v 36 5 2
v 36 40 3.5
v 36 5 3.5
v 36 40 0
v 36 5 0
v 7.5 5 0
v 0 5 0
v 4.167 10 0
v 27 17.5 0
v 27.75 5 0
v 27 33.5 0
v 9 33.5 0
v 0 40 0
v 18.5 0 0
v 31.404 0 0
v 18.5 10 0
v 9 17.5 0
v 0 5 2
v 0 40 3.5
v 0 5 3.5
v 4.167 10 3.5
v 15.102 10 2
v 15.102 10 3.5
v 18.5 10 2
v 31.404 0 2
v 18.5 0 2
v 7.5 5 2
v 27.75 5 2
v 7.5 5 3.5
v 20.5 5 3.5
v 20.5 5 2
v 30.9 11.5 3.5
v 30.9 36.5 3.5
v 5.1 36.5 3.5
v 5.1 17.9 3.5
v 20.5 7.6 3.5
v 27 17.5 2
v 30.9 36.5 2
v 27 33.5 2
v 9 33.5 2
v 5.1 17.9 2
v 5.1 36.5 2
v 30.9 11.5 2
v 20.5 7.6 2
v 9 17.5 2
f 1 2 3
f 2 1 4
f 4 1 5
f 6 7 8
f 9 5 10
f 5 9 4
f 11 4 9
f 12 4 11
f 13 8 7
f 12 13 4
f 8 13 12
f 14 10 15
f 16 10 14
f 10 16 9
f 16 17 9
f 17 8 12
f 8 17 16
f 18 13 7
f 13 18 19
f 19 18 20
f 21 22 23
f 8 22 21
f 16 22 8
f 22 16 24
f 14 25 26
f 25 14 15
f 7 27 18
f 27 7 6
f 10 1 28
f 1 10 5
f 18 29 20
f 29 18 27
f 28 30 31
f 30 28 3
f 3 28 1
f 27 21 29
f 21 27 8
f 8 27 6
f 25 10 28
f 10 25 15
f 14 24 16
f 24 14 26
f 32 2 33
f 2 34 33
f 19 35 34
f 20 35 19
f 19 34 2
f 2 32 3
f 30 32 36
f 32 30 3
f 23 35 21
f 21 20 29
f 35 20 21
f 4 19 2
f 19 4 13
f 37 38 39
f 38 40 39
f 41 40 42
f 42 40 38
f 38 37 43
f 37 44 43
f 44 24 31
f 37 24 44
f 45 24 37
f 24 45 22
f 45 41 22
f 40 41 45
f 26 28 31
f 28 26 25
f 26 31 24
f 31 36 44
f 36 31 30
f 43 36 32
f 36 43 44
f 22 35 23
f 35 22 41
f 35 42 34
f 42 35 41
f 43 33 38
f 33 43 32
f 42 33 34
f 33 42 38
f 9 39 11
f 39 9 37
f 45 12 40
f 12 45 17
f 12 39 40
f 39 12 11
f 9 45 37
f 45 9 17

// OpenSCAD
piece_width = 36;
piece_depth = 40;
thickness_full = 3.5;
thickness_thin = 2;
cutout1_depth = 13.5;
cutout1_width = 13.5;
htriml_depth = 5;
htrimr_depth = 5;
htrimc_depth = 10;
htrim2_width = 5;
cutout_mid_x = 18;
cutout_mid_y = 16;
port_piece_depth = 29.5;

tolerance = 0.25;

difference(){
	main_piece();
	translate([(piece_width-25.8)/2,port_piece_depth+7,thickness_thin]) 
			port_piece(12,25.8,25,port_piece_depth,18.6);

	//middle cutout
	translate([(piece_width-cutout_mid_x)/2,cutout1_depth+4,-1]) 
			cube([cutout_mid_x,cutout_mid_y,thickness_full+2]);

	//temp
	//translate([0,14,-1]) cube([piece_width,50,6]);
}

module port_piece(x1,x2,y1,y2,y3){
	linear_extrude(height=(thickness_full-thickness_thin+1))
		translate([x2,0,0]) rotate([0,0,180]) 
		polygon([ [0,0], [0,y1], [x1,y2], [x2,y3], [x2,0] ], [ [0,1,2,3,4] ]);
}


module main_piece() {
difference(){
	cube([piece_width,piece_depth,thickness_full]);
	
	cutout();

	//trim thickness
	translate([0,0,thickness_thin]) 
			cube([piece_width/2+1,htriml_depth,thickness_full]);
	translate([piece_width/2,0,thickness_thin]) 
			cube([piece_width/2+1,htrimr_depth,thickness_full]);
	translate([(piece_width-htrim2_width)/2,0,thickness_thin]) 
			cube([htrim2_width,htrimc_depth,thickness_full]);
}
}

module cutout(){
topline = 0.25;
difference(){
cube([piece_width,10,10]);
translate([piece_width/2,10,0])
	linear_extrude(height=10)
		polygon([ [0.5,topline], [0.5,-11.5], [14.5,-11.5], [9.75,-5], [piece_width/2,-5],
				[piece_width/2,topline], [-piece_width/2,topline],
				[-piece_width/2,-5], [-10.5,-5], [-14,topline]   ], 
			[ [ 0, 1, 2, 3, 4, 5, 6, 7, 8, 9] ] );
}
}

module triangle(length, width, height){
	polyhedron([[0,0,0], [0,0,height], [width,0,0], [width,0,height], 
			[0,length,0], [0,length,height] ], 
		[ [0,1,3], [0,3,2], [0,4,5], [0,5,1], [2,3,5], [2,5,4],
			[0,2,4], [1,5,3] ]);
}
